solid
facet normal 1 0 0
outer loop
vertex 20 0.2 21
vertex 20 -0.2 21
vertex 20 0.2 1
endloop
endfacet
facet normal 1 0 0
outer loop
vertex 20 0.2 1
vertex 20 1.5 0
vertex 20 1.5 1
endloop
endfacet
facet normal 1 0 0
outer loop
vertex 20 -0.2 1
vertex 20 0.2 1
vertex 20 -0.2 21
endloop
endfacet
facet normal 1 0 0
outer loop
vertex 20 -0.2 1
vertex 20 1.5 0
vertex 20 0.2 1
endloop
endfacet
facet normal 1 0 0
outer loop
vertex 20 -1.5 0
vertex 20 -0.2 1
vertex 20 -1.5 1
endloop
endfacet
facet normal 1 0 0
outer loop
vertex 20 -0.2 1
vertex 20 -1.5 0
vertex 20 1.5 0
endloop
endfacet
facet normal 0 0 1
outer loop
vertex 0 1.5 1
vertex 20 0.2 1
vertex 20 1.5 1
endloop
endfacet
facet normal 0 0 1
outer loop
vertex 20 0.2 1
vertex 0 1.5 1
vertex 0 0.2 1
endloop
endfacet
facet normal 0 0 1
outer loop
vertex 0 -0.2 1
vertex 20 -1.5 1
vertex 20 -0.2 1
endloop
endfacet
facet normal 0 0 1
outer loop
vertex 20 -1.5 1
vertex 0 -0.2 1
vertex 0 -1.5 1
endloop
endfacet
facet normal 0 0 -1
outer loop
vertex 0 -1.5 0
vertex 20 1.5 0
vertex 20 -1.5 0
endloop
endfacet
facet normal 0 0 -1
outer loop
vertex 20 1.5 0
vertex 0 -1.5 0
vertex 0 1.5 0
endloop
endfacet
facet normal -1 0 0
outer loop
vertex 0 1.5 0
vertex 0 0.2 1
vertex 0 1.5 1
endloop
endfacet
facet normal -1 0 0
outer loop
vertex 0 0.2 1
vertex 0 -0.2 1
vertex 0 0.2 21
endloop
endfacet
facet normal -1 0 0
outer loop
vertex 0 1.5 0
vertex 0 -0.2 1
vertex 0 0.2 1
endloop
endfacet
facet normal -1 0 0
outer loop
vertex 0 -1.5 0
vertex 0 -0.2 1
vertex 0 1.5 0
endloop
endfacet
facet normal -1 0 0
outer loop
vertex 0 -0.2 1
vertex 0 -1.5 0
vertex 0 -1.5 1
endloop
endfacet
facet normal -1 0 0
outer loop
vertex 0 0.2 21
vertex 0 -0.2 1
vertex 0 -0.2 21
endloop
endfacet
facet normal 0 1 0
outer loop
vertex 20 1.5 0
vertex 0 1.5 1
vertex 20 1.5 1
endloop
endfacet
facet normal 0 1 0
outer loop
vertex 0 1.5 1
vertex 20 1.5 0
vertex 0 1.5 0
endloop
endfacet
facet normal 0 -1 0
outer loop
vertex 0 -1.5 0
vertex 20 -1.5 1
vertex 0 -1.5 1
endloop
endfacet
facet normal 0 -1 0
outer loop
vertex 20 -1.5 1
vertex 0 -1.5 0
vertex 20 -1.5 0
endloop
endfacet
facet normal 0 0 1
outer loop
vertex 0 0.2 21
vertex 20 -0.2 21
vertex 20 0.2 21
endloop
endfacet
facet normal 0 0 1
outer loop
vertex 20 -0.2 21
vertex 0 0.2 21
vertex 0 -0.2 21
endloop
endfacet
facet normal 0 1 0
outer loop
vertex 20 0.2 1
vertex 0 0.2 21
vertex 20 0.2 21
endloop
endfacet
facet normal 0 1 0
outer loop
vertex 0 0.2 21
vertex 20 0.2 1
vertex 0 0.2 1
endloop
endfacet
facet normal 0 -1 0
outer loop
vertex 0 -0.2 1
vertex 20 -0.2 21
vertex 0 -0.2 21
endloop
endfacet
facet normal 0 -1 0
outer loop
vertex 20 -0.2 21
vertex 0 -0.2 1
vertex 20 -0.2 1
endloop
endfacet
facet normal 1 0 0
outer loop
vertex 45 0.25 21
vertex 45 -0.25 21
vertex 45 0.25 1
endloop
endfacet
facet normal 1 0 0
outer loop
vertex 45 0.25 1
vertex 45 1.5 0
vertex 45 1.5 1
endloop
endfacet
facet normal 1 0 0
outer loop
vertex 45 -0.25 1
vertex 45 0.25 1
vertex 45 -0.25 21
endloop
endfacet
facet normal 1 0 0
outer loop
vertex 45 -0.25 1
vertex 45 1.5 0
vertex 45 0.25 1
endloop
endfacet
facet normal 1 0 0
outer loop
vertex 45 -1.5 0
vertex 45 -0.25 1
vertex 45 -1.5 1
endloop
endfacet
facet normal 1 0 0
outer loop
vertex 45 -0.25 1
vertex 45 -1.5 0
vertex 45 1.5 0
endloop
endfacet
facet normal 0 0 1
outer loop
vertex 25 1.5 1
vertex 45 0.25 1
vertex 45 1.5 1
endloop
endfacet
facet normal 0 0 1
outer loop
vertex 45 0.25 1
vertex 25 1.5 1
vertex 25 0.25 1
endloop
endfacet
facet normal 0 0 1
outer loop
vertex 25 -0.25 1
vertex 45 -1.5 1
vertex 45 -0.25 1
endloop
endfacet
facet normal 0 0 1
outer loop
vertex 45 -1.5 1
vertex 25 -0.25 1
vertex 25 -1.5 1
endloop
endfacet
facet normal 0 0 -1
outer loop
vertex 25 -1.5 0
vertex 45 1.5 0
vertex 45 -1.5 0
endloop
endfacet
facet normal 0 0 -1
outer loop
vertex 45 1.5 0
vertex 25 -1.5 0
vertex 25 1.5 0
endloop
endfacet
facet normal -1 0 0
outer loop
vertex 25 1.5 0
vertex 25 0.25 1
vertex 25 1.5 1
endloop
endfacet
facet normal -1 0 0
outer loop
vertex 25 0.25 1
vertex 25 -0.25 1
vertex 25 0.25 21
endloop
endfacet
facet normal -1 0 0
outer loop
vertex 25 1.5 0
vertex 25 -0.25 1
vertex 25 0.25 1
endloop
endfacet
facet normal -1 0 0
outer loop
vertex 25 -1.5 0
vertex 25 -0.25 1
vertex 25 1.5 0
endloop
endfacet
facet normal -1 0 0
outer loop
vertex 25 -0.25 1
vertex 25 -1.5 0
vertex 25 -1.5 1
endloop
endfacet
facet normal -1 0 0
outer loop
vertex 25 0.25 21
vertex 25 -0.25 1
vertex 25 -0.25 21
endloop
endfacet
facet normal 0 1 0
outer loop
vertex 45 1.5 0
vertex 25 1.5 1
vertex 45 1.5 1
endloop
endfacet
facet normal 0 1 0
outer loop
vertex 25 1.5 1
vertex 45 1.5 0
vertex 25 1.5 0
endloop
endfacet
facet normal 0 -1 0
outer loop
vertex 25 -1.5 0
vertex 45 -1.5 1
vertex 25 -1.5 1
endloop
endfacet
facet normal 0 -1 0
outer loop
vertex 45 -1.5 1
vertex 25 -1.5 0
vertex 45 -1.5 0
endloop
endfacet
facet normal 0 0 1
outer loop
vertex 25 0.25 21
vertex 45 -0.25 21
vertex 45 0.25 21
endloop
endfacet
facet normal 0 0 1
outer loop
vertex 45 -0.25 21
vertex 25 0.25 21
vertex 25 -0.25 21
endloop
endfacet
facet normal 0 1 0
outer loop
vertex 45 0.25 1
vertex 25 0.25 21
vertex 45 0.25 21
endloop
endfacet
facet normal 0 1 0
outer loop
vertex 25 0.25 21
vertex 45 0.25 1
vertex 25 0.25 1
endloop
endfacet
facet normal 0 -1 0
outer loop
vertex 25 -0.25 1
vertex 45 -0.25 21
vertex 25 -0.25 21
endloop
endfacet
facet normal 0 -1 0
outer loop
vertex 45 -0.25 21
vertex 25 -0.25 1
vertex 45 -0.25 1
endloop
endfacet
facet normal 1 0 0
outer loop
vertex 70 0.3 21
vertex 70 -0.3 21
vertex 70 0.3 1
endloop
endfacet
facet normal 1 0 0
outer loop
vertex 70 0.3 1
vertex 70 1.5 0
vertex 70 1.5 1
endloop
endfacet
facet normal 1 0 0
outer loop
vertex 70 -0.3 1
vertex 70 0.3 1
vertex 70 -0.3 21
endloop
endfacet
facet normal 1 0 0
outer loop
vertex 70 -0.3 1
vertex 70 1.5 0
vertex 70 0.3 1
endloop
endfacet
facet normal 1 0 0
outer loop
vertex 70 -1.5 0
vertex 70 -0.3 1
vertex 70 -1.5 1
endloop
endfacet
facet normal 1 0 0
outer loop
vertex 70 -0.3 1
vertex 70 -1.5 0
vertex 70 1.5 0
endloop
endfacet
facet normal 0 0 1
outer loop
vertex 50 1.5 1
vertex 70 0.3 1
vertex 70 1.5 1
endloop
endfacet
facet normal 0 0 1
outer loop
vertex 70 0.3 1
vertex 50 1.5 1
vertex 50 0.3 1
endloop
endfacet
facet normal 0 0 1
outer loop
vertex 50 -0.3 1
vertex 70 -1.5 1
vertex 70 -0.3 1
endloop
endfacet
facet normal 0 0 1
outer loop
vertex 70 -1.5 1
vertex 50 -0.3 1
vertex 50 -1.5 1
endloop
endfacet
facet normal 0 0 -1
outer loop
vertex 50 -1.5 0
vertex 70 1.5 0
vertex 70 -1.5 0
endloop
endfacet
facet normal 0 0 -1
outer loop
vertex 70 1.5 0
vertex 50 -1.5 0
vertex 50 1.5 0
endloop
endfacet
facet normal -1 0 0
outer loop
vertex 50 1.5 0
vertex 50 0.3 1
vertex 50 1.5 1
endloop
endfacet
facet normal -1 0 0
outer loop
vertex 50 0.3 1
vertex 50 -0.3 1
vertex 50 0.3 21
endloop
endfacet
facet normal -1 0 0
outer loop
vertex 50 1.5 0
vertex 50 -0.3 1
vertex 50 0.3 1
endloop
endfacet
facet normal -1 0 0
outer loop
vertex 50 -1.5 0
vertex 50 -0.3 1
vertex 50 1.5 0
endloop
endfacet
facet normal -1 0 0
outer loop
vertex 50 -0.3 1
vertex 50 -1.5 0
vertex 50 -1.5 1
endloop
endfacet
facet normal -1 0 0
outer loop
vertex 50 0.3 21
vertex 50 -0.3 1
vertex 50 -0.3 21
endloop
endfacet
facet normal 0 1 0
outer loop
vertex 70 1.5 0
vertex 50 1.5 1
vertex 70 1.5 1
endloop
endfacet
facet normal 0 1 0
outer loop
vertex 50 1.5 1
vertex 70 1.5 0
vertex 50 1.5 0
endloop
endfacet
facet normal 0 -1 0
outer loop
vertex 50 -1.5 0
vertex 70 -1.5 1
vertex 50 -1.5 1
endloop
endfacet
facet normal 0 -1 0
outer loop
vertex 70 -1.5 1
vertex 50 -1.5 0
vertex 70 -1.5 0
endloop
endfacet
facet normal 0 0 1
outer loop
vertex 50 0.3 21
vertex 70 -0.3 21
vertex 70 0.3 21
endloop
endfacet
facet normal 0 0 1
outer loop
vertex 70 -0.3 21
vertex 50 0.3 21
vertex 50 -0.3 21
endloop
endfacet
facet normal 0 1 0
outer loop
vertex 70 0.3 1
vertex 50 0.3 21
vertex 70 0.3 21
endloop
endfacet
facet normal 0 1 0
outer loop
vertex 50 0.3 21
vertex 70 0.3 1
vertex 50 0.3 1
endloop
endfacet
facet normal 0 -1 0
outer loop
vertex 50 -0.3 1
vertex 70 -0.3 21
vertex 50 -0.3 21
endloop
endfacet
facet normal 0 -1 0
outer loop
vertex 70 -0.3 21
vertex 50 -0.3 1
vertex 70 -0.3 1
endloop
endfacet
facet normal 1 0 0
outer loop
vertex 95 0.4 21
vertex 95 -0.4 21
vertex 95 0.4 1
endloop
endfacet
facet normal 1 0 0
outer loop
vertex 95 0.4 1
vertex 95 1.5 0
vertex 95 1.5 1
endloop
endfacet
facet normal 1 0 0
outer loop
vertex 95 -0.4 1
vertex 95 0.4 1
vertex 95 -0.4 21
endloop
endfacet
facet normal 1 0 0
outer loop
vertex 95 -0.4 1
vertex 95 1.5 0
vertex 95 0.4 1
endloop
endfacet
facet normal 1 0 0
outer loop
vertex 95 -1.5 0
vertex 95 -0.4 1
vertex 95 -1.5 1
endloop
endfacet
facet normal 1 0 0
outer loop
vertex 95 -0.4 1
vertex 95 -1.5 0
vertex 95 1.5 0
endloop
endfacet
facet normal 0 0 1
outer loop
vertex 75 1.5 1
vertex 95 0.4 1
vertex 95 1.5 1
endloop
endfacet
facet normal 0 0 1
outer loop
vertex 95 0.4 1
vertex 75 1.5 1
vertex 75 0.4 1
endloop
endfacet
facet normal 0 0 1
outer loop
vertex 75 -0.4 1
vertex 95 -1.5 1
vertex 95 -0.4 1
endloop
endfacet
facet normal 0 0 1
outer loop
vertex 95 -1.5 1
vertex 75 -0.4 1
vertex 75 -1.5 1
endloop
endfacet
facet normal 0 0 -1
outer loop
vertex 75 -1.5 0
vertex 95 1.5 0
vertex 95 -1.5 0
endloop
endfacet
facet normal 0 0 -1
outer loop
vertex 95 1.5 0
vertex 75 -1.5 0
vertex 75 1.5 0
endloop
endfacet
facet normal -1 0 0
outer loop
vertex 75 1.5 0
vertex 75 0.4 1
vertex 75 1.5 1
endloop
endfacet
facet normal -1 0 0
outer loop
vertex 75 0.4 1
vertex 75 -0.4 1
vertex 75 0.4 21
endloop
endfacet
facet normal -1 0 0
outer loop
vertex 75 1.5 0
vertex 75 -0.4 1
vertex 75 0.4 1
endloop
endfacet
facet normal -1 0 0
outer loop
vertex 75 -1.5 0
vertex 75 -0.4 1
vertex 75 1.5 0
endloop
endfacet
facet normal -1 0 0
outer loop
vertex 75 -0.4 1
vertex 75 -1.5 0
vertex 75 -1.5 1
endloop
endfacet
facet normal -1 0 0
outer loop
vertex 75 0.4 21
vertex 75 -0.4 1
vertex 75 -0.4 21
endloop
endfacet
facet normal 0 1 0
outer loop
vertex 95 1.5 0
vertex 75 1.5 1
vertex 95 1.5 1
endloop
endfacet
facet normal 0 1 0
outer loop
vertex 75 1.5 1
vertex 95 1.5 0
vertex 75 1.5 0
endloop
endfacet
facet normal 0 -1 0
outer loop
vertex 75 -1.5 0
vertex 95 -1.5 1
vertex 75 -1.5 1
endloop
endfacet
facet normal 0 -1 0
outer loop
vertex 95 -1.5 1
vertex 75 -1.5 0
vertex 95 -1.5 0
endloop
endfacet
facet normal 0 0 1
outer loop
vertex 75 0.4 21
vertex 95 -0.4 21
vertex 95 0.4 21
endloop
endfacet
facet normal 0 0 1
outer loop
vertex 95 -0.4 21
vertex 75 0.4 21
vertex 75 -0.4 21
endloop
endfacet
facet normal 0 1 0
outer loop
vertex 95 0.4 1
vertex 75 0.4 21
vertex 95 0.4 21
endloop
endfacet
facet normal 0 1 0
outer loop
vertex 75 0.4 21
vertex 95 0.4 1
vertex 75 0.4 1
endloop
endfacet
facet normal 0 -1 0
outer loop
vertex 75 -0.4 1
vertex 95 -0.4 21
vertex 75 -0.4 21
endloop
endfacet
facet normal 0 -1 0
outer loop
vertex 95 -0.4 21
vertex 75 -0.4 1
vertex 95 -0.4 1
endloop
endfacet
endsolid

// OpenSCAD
/*
	flow-wall — 单壁厚阶梯（挤出流量 / 线宽）

	测什么
		四片单壁薄板，设计壁厚 0.4 / 0.5 / 0.6 / 0.8 mm，高 20 mm。
		每片只用一条挤出线，打完用卡尺量实际壁厚 = 实际线宽。

	怎么判读
		- 0.4 片量出 0.42–0.46 mm 属正常：切片器按 0.42 线宽外扩。
		- 四片全部偏薄（<设计值-0.03）：流量不足，flow 从 95% 往 100% 调。
		- 四片全部偏厚（>设计值+0.06）：流量过量，flow 降到 95% 左右或降温度。
		- 四片之间厚度差 >0.05 mm：线宽随速度/温度漂移，先稳速度再调流量。
		- 壁面有针孔 = 流量不足；有毛边鼓包 = 流量过量 / 温度过高 / 回抽不足。
		- 打印方式：1 圈外墙、0 填充、0 顶底；**不要用花瓶模式**（四片是分离实体，
		  花瓶模式会在片间断开）。四片之间会有空驶，出现拉丝属正常，不影响壁厚判读。

	期望值（默认参数）
		STL 体积 1.160 cm³，包围盒 95.00 × 3.00 × 21.00 mm，4 个独立实体，水密。
		每片壁厚 = 参数值（模型是精确的，误差只可能来自打印）。

	参数
		wall_t1..t4  四片设计壁厚 (mm)
		wall_w       每片宽 (X)
		wall_h       每片高 (Z)
		gap          片间净距 (X)
		base_d/base_h  贴床小垫脚：只负责粘床，不参与厚度判读
*/

/* [单壁阶梯 (mm)] */
wall_t1 = 0.4;    // 第 1 片设计壁厚
wall_t2 = 0.5;    // 第 2 片
wall_t3 = 0.6;    // 第 3 片
wall_t4 = 0.8;    // 第 4 片

/* [尺寸] */
wall_w = 20;      // 每片宽 (X)
wall_h = 20;      // 每片高 (Z)
gap = 5;          // 片间净距 (X)

/* [垫脚：只为贴床] */
base_d = 3;       // 垫脚深 (Y)
base_h = 1;       // 垫脚高 (Z)

assert(wall_w > 0 && wall_h > 0, "wall_w / wall_h 必须 > 0");
assert(min([wall_t1, wall_t2, wall_t3, wall_t4]) > 0, "壁厚必须 > 0");
assert(base_d > max([wall_t1, wall_t2, wall_t3, wall_t4]), "base_d 必须大于最厚的一片，否则壁片会悬在垫脚外");

module flow_patch(t) {
	// 垫脚 + 居中直壁：壁片从垫脚顶面起算，底面与垫脚共面并压进 0.01，
	// 避免两个实体只共面接触（CGAL 对这种共面并集偶尔会留下内壁）。
	translate([0, -base_d / 2, 0]) cube([wall_w, base_d, base_h]);
	translate([0, -t / 2, base_h - 0.01]) cube([wall_w, t, wall_h + 0.01]);
}

for (i = [0:3]) {
	t = [wall_t1, wall_t2, wall_t3, wall_t4][i];
	translate([i * (wall_w + gap), 0, 0]) flow_patch(t);
}
